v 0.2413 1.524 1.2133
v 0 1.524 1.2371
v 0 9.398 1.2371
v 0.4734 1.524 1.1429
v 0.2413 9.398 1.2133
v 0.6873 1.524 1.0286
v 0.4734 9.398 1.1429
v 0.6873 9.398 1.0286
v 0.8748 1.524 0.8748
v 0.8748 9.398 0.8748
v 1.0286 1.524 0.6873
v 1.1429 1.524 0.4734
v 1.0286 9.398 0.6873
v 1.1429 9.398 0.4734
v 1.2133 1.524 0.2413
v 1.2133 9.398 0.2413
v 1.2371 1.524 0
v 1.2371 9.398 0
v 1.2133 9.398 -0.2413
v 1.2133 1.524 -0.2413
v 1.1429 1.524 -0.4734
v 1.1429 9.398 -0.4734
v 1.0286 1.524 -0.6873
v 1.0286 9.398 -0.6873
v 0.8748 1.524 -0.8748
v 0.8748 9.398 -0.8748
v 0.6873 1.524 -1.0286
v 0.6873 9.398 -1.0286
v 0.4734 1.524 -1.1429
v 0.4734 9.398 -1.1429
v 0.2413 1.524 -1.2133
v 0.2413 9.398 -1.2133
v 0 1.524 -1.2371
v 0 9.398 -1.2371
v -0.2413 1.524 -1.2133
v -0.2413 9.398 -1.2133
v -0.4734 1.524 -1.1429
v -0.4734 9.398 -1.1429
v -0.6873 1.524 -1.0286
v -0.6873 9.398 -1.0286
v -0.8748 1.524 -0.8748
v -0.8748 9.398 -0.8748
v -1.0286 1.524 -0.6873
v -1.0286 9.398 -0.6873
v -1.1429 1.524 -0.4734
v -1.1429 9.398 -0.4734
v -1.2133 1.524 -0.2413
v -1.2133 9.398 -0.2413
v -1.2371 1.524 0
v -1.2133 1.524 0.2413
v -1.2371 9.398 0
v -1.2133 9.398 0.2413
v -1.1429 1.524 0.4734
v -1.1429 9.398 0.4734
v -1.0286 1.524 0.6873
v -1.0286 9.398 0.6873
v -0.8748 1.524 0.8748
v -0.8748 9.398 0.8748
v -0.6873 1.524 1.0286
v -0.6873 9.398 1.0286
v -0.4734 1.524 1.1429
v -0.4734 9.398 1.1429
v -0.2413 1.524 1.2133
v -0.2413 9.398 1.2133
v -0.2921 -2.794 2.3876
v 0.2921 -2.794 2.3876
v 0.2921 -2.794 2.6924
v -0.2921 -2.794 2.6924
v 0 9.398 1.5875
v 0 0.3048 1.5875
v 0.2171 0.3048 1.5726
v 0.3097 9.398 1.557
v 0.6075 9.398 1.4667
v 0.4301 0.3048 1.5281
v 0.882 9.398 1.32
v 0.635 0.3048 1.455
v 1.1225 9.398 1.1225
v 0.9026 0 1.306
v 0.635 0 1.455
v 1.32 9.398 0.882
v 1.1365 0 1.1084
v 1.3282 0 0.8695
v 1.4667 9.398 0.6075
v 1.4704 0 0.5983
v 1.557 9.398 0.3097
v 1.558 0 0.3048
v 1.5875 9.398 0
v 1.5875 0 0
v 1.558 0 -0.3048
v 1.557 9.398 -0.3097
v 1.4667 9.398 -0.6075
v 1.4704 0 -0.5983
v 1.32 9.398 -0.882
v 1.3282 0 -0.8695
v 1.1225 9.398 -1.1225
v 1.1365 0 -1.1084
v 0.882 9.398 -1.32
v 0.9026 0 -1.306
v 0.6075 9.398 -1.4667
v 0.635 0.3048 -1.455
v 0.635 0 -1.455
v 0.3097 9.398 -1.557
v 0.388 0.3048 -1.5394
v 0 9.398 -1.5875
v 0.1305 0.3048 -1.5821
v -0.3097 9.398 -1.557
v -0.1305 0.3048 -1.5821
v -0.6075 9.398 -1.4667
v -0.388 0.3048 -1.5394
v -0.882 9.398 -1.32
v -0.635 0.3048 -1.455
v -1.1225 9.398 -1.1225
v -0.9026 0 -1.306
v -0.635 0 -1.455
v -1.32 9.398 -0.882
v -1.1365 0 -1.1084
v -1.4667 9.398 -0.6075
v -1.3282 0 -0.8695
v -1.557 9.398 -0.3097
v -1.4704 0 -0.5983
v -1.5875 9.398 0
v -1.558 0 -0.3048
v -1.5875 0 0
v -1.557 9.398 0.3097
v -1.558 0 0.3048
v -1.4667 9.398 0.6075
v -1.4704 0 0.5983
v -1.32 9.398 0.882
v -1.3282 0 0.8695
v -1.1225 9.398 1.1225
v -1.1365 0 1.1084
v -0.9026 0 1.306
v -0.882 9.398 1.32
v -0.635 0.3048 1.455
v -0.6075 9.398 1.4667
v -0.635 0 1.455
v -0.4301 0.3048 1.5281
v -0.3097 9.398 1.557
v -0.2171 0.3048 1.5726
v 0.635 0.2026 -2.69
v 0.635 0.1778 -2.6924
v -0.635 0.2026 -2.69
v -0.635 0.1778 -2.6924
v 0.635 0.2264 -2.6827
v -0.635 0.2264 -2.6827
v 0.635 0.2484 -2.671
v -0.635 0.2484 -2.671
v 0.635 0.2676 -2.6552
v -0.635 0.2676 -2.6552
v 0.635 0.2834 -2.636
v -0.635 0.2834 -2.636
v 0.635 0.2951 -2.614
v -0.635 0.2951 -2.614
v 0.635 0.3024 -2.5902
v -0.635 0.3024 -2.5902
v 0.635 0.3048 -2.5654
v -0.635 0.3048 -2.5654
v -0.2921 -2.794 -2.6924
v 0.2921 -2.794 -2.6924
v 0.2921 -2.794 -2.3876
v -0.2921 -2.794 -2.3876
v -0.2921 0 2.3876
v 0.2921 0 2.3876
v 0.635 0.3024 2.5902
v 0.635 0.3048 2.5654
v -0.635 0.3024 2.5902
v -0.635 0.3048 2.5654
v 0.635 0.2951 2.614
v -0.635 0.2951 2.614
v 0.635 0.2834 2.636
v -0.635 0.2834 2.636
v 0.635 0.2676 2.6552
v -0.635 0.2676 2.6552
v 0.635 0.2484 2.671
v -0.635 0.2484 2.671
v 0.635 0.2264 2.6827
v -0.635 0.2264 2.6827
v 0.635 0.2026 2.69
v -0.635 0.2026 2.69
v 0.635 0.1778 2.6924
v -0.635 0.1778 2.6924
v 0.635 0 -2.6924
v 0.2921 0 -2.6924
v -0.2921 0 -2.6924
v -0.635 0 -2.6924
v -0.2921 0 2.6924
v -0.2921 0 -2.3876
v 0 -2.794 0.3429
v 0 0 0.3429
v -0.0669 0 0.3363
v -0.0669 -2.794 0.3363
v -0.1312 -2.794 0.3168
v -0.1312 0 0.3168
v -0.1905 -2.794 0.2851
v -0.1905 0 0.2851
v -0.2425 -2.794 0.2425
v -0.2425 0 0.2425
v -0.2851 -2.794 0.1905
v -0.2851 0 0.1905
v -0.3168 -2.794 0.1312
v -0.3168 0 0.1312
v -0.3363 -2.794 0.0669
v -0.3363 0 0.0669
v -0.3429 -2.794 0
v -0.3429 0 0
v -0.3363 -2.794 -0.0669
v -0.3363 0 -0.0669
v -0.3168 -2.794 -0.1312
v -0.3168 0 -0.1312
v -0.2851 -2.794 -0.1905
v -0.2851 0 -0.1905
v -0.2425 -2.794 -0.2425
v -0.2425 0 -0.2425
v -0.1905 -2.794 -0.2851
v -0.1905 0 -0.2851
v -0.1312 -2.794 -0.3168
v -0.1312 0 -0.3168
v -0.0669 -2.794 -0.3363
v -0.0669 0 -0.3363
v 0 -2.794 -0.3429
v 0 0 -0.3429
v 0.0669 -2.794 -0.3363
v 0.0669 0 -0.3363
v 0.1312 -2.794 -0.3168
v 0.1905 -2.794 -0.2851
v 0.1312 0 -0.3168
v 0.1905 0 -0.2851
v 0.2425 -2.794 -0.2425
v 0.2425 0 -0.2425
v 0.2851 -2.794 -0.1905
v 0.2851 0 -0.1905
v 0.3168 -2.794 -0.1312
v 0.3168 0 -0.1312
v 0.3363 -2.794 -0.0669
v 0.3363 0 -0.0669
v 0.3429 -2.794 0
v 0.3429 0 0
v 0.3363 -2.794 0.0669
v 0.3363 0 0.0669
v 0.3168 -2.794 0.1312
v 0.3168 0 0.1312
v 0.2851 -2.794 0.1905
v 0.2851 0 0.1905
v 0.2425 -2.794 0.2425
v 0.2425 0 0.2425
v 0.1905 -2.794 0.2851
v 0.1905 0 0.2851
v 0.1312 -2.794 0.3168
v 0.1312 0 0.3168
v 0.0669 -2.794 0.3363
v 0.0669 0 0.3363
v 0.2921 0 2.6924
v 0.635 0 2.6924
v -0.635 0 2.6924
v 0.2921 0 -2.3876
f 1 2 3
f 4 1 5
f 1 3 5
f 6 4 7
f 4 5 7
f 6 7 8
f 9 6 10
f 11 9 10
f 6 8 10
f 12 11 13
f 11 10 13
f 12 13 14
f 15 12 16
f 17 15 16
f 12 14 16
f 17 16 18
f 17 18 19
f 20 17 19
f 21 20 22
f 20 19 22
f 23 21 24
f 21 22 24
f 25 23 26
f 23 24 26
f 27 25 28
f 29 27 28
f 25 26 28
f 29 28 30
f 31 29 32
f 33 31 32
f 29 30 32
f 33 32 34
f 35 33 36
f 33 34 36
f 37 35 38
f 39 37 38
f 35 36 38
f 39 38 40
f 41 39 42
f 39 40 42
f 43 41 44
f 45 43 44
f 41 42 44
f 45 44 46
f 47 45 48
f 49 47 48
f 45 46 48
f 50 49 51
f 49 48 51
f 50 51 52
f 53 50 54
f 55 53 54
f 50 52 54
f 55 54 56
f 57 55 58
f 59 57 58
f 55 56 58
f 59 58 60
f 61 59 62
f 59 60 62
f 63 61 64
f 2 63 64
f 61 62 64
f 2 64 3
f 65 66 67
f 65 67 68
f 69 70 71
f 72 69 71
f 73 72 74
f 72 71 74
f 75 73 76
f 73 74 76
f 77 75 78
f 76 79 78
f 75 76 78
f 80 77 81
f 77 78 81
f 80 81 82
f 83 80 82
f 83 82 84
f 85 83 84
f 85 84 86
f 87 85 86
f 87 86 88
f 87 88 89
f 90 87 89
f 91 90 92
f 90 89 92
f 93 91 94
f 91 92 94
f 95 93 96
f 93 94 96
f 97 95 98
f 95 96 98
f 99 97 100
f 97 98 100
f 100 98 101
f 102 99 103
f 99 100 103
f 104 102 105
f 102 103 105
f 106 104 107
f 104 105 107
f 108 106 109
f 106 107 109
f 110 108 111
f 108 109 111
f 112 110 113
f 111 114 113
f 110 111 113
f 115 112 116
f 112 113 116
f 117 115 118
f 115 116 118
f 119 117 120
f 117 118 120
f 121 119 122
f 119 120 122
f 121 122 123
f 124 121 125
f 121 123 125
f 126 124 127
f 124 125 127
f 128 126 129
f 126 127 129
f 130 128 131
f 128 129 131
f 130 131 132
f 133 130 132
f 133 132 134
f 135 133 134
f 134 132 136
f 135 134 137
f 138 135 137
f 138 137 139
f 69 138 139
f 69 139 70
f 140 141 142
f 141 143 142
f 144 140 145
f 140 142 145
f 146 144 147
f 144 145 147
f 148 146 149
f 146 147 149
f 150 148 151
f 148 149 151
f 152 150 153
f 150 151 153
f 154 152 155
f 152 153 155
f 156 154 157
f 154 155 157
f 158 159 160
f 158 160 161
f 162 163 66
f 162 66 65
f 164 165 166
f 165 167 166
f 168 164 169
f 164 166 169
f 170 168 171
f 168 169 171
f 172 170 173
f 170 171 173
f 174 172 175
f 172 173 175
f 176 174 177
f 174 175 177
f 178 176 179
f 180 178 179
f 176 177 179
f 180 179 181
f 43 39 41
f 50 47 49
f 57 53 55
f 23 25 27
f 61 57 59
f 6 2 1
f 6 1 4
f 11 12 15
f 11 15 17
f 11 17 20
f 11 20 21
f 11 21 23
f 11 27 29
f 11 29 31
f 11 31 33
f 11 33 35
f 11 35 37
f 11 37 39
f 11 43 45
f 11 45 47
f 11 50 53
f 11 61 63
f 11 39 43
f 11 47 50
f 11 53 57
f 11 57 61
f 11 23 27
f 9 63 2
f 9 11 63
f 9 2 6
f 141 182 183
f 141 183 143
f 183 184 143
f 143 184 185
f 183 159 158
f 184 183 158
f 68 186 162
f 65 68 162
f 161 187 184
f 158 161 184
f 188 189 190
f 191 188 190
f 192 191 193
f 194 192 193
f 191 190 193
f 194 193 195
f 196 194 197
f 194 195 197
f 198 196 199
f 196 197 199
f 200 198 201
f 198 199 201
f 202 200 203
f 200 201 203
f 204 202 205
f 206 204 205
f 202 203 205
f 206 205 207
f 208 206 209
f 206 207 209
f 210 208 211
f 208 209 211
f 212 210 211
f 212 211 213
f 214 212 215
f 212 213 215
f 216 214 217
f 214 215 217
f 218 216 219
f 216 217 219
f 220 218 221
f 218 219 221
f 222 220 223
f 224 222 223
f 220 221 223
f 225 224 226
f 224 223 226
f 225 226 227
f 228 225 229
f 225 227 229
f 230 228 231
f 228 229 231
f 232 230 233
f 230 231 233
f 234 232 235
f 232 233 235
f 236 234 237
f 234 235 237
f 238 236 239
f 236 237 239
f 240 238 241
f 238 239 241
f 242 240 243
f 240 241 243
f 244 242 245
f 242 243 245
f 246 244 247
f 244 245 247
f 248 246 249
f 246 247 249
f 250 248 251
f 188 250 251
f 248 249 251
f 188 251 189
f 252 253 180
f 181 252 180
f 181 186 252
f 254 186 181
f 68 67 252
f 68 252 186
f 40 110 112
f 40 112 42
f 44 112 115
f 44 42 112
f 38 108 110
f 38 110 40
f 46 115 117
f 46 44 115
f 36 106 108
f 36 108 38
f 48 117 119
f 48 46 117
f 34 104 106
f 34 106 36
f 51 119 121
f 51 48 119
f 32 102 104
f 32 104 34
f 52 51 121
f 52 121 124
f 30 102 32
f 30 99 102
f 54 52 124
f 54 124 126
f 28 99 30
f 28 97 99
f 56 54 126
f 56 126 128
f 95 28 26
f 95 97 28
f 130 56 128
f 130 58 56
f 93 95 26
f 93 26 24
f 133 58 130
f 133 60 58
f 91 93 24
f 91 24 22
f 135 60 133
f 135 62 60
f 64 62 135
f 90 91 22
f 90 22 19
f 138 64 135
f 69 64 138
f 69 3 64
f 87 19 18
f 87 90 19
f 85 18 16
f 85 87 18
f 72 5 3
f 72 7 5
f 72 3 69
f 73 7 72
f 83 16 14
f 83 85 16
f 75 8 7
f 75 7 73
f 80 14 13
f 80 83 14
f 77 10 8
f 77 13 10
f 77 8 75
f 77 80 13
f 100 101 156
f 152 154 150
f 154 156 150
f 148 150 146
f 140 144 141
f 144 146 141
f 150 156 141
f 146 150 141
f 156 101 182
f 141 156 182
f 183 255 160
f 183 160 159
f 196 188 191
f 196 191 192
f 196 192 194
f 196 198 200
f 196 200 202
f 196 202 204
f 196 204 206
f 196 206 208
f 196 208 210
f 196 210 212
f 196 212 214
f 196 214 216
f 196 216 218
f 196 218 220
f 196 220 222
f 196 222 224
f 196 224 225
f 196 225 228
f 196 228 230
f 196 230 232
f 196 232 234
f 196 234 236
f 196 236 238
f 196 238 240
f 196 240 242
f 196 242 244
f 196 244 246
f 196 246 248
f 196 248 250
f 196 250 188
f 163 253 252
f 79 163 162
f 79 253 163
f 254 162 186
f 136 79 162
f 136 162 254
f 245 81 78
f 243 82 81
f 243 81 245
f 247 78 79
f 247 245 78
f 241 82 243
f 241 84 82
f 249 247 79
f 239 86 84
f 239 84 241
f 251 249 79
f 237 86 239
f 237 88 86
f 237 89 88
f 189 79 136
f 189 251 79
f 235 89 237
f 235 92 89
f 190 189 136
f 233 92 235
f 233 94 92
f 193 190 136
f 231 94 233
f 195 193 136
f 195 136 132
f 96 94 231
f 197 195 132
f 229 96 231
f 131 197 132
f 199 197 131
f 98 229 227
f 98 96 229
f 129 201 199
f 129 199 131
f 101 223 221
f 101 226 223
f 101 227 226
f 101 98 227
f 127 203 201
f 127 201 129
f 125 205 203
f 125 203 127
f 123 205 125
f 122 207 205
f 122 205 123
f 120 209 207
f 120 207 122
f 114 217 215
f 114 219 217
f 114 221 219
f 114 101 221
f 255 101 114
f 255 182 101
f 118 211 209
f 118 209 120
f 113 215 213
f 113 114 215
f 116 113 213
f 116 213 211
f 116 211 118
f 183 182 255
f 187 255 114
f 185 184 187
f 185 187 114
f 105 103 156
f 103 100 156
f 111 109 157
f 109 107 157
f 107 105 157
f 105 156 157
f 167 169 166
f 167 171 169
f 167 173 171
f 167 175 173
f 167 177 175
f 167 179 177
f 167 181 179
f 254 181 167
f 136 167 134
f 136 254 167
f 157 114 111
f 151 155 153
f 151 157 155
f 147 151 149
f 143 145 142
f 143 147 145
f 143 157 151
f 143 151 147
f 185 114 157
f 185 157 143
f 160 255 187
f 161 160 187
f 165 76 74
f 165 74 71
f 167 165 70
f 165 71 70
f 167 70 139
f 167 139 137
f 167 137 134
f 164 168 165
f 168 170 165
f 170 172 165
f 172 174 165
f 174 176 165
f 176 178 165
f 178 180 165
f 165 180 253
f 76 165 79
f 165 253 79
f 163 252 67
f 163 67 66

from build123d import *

# Parameters (mm, degrees)
SKETCH1_R           = 1.5875
BOSS_EXTRUDE1_DEPTH = 9.398
SKETCH2_R           = 0.3429
BOSS_EXTRUDE2_DEPTH = 2.794
SKETCH3_W           = 1.27
SKETCH3_H           = 5.3848
BOSS_EXTRUDE3_DEPTH = 0.3048
SKETCH4_W           = 0.5842
SKETCH4_H           = 0.3048
BOSS_EXTRUDE4_DEPTH = 2.794
FILLET1_R           = 0.127
SKETCH5_R           = 1.237083483
CUT_EXTRUDE1_DEPTH  = 7.874


with BuildPart() as part:
    # Sketch1 → Boss-Extrude1 (new body)
    with BuildSketch(Plane(origin=(0, 0, 0), x_dir=(1, 0, 0), z_dir=(0, 1, 0))):
        with Locations(Location((0, 0, 0), (0, 0, 270))):
            Circle(SKETCH1_R)
    extrude(amount=BOSS_EXTRUDE1_DEPTH)

    # Sketch2 → Boss-Extrude2 (add)
    with BuildSketch(Plane(origin=(0, 0, 0), x_dir=(-1, 0, 0), z_dir=(0, -1, 0))):
        with Locations(Location((0, 0, 0), (0, 0, 270))):
            Circle(SKETCH2_R)
    extrude(amount=BOSS_EXTRUDE2_DEPTH)

    # Sketch3 → Boss-Extrude3 (add)
    with BuildSketch(Plane(origin=(0, 0, 0), x_dir=(-1, 0, 0), z_dir=(0, -1, 0))):
        Rectangle(SKETCH3_W, SKETCH3_H)
    extrude(amount=-BOSS_EXTRUDE3_DEPTH)

    # Sketch4 → Boss-Extrude4 (add)
    with BuildSketch(Plane(origin=(0, 0, 0), x_dir=(-1, 0, 0), z_dir=(0, -1, 0))):
        with Locations((0, 2.54)):
            Rectangle(SKETCH4_W, SKETCH4_H)
        with Locations((0, -2.54)):
            Rectangle(SKETCH4_W, SKETCH4_H)
    extrude(amount=BOSS_EXTRUDE4_DEPTH)

    # Fillet1
    fillet1_edges = [part.edges().sort_by_distance(p)[0] for p in [
        (0, 0.3048, 2.6924),
        (0, 0.3048, -2.6924),
    ]]
    fillet(fillet1_edges, radius=FILLET1_R)

    # Sketch5 → Cut-Extrude1 (cut)
    with BuildSketch(Plane(origin=(0, 9.398, 0), x_dir=(1, 0, 0), z_dir=(0, 1, 0))):
        with Locations(Location((0, 0, 0), (0, 0, 270))):
            Circle(SKETCH5_R)
    extrude(amount=-CUT_EXTRUDE1_DEPTH, mode=Mode.SUBTRACT)


solid = part.part
